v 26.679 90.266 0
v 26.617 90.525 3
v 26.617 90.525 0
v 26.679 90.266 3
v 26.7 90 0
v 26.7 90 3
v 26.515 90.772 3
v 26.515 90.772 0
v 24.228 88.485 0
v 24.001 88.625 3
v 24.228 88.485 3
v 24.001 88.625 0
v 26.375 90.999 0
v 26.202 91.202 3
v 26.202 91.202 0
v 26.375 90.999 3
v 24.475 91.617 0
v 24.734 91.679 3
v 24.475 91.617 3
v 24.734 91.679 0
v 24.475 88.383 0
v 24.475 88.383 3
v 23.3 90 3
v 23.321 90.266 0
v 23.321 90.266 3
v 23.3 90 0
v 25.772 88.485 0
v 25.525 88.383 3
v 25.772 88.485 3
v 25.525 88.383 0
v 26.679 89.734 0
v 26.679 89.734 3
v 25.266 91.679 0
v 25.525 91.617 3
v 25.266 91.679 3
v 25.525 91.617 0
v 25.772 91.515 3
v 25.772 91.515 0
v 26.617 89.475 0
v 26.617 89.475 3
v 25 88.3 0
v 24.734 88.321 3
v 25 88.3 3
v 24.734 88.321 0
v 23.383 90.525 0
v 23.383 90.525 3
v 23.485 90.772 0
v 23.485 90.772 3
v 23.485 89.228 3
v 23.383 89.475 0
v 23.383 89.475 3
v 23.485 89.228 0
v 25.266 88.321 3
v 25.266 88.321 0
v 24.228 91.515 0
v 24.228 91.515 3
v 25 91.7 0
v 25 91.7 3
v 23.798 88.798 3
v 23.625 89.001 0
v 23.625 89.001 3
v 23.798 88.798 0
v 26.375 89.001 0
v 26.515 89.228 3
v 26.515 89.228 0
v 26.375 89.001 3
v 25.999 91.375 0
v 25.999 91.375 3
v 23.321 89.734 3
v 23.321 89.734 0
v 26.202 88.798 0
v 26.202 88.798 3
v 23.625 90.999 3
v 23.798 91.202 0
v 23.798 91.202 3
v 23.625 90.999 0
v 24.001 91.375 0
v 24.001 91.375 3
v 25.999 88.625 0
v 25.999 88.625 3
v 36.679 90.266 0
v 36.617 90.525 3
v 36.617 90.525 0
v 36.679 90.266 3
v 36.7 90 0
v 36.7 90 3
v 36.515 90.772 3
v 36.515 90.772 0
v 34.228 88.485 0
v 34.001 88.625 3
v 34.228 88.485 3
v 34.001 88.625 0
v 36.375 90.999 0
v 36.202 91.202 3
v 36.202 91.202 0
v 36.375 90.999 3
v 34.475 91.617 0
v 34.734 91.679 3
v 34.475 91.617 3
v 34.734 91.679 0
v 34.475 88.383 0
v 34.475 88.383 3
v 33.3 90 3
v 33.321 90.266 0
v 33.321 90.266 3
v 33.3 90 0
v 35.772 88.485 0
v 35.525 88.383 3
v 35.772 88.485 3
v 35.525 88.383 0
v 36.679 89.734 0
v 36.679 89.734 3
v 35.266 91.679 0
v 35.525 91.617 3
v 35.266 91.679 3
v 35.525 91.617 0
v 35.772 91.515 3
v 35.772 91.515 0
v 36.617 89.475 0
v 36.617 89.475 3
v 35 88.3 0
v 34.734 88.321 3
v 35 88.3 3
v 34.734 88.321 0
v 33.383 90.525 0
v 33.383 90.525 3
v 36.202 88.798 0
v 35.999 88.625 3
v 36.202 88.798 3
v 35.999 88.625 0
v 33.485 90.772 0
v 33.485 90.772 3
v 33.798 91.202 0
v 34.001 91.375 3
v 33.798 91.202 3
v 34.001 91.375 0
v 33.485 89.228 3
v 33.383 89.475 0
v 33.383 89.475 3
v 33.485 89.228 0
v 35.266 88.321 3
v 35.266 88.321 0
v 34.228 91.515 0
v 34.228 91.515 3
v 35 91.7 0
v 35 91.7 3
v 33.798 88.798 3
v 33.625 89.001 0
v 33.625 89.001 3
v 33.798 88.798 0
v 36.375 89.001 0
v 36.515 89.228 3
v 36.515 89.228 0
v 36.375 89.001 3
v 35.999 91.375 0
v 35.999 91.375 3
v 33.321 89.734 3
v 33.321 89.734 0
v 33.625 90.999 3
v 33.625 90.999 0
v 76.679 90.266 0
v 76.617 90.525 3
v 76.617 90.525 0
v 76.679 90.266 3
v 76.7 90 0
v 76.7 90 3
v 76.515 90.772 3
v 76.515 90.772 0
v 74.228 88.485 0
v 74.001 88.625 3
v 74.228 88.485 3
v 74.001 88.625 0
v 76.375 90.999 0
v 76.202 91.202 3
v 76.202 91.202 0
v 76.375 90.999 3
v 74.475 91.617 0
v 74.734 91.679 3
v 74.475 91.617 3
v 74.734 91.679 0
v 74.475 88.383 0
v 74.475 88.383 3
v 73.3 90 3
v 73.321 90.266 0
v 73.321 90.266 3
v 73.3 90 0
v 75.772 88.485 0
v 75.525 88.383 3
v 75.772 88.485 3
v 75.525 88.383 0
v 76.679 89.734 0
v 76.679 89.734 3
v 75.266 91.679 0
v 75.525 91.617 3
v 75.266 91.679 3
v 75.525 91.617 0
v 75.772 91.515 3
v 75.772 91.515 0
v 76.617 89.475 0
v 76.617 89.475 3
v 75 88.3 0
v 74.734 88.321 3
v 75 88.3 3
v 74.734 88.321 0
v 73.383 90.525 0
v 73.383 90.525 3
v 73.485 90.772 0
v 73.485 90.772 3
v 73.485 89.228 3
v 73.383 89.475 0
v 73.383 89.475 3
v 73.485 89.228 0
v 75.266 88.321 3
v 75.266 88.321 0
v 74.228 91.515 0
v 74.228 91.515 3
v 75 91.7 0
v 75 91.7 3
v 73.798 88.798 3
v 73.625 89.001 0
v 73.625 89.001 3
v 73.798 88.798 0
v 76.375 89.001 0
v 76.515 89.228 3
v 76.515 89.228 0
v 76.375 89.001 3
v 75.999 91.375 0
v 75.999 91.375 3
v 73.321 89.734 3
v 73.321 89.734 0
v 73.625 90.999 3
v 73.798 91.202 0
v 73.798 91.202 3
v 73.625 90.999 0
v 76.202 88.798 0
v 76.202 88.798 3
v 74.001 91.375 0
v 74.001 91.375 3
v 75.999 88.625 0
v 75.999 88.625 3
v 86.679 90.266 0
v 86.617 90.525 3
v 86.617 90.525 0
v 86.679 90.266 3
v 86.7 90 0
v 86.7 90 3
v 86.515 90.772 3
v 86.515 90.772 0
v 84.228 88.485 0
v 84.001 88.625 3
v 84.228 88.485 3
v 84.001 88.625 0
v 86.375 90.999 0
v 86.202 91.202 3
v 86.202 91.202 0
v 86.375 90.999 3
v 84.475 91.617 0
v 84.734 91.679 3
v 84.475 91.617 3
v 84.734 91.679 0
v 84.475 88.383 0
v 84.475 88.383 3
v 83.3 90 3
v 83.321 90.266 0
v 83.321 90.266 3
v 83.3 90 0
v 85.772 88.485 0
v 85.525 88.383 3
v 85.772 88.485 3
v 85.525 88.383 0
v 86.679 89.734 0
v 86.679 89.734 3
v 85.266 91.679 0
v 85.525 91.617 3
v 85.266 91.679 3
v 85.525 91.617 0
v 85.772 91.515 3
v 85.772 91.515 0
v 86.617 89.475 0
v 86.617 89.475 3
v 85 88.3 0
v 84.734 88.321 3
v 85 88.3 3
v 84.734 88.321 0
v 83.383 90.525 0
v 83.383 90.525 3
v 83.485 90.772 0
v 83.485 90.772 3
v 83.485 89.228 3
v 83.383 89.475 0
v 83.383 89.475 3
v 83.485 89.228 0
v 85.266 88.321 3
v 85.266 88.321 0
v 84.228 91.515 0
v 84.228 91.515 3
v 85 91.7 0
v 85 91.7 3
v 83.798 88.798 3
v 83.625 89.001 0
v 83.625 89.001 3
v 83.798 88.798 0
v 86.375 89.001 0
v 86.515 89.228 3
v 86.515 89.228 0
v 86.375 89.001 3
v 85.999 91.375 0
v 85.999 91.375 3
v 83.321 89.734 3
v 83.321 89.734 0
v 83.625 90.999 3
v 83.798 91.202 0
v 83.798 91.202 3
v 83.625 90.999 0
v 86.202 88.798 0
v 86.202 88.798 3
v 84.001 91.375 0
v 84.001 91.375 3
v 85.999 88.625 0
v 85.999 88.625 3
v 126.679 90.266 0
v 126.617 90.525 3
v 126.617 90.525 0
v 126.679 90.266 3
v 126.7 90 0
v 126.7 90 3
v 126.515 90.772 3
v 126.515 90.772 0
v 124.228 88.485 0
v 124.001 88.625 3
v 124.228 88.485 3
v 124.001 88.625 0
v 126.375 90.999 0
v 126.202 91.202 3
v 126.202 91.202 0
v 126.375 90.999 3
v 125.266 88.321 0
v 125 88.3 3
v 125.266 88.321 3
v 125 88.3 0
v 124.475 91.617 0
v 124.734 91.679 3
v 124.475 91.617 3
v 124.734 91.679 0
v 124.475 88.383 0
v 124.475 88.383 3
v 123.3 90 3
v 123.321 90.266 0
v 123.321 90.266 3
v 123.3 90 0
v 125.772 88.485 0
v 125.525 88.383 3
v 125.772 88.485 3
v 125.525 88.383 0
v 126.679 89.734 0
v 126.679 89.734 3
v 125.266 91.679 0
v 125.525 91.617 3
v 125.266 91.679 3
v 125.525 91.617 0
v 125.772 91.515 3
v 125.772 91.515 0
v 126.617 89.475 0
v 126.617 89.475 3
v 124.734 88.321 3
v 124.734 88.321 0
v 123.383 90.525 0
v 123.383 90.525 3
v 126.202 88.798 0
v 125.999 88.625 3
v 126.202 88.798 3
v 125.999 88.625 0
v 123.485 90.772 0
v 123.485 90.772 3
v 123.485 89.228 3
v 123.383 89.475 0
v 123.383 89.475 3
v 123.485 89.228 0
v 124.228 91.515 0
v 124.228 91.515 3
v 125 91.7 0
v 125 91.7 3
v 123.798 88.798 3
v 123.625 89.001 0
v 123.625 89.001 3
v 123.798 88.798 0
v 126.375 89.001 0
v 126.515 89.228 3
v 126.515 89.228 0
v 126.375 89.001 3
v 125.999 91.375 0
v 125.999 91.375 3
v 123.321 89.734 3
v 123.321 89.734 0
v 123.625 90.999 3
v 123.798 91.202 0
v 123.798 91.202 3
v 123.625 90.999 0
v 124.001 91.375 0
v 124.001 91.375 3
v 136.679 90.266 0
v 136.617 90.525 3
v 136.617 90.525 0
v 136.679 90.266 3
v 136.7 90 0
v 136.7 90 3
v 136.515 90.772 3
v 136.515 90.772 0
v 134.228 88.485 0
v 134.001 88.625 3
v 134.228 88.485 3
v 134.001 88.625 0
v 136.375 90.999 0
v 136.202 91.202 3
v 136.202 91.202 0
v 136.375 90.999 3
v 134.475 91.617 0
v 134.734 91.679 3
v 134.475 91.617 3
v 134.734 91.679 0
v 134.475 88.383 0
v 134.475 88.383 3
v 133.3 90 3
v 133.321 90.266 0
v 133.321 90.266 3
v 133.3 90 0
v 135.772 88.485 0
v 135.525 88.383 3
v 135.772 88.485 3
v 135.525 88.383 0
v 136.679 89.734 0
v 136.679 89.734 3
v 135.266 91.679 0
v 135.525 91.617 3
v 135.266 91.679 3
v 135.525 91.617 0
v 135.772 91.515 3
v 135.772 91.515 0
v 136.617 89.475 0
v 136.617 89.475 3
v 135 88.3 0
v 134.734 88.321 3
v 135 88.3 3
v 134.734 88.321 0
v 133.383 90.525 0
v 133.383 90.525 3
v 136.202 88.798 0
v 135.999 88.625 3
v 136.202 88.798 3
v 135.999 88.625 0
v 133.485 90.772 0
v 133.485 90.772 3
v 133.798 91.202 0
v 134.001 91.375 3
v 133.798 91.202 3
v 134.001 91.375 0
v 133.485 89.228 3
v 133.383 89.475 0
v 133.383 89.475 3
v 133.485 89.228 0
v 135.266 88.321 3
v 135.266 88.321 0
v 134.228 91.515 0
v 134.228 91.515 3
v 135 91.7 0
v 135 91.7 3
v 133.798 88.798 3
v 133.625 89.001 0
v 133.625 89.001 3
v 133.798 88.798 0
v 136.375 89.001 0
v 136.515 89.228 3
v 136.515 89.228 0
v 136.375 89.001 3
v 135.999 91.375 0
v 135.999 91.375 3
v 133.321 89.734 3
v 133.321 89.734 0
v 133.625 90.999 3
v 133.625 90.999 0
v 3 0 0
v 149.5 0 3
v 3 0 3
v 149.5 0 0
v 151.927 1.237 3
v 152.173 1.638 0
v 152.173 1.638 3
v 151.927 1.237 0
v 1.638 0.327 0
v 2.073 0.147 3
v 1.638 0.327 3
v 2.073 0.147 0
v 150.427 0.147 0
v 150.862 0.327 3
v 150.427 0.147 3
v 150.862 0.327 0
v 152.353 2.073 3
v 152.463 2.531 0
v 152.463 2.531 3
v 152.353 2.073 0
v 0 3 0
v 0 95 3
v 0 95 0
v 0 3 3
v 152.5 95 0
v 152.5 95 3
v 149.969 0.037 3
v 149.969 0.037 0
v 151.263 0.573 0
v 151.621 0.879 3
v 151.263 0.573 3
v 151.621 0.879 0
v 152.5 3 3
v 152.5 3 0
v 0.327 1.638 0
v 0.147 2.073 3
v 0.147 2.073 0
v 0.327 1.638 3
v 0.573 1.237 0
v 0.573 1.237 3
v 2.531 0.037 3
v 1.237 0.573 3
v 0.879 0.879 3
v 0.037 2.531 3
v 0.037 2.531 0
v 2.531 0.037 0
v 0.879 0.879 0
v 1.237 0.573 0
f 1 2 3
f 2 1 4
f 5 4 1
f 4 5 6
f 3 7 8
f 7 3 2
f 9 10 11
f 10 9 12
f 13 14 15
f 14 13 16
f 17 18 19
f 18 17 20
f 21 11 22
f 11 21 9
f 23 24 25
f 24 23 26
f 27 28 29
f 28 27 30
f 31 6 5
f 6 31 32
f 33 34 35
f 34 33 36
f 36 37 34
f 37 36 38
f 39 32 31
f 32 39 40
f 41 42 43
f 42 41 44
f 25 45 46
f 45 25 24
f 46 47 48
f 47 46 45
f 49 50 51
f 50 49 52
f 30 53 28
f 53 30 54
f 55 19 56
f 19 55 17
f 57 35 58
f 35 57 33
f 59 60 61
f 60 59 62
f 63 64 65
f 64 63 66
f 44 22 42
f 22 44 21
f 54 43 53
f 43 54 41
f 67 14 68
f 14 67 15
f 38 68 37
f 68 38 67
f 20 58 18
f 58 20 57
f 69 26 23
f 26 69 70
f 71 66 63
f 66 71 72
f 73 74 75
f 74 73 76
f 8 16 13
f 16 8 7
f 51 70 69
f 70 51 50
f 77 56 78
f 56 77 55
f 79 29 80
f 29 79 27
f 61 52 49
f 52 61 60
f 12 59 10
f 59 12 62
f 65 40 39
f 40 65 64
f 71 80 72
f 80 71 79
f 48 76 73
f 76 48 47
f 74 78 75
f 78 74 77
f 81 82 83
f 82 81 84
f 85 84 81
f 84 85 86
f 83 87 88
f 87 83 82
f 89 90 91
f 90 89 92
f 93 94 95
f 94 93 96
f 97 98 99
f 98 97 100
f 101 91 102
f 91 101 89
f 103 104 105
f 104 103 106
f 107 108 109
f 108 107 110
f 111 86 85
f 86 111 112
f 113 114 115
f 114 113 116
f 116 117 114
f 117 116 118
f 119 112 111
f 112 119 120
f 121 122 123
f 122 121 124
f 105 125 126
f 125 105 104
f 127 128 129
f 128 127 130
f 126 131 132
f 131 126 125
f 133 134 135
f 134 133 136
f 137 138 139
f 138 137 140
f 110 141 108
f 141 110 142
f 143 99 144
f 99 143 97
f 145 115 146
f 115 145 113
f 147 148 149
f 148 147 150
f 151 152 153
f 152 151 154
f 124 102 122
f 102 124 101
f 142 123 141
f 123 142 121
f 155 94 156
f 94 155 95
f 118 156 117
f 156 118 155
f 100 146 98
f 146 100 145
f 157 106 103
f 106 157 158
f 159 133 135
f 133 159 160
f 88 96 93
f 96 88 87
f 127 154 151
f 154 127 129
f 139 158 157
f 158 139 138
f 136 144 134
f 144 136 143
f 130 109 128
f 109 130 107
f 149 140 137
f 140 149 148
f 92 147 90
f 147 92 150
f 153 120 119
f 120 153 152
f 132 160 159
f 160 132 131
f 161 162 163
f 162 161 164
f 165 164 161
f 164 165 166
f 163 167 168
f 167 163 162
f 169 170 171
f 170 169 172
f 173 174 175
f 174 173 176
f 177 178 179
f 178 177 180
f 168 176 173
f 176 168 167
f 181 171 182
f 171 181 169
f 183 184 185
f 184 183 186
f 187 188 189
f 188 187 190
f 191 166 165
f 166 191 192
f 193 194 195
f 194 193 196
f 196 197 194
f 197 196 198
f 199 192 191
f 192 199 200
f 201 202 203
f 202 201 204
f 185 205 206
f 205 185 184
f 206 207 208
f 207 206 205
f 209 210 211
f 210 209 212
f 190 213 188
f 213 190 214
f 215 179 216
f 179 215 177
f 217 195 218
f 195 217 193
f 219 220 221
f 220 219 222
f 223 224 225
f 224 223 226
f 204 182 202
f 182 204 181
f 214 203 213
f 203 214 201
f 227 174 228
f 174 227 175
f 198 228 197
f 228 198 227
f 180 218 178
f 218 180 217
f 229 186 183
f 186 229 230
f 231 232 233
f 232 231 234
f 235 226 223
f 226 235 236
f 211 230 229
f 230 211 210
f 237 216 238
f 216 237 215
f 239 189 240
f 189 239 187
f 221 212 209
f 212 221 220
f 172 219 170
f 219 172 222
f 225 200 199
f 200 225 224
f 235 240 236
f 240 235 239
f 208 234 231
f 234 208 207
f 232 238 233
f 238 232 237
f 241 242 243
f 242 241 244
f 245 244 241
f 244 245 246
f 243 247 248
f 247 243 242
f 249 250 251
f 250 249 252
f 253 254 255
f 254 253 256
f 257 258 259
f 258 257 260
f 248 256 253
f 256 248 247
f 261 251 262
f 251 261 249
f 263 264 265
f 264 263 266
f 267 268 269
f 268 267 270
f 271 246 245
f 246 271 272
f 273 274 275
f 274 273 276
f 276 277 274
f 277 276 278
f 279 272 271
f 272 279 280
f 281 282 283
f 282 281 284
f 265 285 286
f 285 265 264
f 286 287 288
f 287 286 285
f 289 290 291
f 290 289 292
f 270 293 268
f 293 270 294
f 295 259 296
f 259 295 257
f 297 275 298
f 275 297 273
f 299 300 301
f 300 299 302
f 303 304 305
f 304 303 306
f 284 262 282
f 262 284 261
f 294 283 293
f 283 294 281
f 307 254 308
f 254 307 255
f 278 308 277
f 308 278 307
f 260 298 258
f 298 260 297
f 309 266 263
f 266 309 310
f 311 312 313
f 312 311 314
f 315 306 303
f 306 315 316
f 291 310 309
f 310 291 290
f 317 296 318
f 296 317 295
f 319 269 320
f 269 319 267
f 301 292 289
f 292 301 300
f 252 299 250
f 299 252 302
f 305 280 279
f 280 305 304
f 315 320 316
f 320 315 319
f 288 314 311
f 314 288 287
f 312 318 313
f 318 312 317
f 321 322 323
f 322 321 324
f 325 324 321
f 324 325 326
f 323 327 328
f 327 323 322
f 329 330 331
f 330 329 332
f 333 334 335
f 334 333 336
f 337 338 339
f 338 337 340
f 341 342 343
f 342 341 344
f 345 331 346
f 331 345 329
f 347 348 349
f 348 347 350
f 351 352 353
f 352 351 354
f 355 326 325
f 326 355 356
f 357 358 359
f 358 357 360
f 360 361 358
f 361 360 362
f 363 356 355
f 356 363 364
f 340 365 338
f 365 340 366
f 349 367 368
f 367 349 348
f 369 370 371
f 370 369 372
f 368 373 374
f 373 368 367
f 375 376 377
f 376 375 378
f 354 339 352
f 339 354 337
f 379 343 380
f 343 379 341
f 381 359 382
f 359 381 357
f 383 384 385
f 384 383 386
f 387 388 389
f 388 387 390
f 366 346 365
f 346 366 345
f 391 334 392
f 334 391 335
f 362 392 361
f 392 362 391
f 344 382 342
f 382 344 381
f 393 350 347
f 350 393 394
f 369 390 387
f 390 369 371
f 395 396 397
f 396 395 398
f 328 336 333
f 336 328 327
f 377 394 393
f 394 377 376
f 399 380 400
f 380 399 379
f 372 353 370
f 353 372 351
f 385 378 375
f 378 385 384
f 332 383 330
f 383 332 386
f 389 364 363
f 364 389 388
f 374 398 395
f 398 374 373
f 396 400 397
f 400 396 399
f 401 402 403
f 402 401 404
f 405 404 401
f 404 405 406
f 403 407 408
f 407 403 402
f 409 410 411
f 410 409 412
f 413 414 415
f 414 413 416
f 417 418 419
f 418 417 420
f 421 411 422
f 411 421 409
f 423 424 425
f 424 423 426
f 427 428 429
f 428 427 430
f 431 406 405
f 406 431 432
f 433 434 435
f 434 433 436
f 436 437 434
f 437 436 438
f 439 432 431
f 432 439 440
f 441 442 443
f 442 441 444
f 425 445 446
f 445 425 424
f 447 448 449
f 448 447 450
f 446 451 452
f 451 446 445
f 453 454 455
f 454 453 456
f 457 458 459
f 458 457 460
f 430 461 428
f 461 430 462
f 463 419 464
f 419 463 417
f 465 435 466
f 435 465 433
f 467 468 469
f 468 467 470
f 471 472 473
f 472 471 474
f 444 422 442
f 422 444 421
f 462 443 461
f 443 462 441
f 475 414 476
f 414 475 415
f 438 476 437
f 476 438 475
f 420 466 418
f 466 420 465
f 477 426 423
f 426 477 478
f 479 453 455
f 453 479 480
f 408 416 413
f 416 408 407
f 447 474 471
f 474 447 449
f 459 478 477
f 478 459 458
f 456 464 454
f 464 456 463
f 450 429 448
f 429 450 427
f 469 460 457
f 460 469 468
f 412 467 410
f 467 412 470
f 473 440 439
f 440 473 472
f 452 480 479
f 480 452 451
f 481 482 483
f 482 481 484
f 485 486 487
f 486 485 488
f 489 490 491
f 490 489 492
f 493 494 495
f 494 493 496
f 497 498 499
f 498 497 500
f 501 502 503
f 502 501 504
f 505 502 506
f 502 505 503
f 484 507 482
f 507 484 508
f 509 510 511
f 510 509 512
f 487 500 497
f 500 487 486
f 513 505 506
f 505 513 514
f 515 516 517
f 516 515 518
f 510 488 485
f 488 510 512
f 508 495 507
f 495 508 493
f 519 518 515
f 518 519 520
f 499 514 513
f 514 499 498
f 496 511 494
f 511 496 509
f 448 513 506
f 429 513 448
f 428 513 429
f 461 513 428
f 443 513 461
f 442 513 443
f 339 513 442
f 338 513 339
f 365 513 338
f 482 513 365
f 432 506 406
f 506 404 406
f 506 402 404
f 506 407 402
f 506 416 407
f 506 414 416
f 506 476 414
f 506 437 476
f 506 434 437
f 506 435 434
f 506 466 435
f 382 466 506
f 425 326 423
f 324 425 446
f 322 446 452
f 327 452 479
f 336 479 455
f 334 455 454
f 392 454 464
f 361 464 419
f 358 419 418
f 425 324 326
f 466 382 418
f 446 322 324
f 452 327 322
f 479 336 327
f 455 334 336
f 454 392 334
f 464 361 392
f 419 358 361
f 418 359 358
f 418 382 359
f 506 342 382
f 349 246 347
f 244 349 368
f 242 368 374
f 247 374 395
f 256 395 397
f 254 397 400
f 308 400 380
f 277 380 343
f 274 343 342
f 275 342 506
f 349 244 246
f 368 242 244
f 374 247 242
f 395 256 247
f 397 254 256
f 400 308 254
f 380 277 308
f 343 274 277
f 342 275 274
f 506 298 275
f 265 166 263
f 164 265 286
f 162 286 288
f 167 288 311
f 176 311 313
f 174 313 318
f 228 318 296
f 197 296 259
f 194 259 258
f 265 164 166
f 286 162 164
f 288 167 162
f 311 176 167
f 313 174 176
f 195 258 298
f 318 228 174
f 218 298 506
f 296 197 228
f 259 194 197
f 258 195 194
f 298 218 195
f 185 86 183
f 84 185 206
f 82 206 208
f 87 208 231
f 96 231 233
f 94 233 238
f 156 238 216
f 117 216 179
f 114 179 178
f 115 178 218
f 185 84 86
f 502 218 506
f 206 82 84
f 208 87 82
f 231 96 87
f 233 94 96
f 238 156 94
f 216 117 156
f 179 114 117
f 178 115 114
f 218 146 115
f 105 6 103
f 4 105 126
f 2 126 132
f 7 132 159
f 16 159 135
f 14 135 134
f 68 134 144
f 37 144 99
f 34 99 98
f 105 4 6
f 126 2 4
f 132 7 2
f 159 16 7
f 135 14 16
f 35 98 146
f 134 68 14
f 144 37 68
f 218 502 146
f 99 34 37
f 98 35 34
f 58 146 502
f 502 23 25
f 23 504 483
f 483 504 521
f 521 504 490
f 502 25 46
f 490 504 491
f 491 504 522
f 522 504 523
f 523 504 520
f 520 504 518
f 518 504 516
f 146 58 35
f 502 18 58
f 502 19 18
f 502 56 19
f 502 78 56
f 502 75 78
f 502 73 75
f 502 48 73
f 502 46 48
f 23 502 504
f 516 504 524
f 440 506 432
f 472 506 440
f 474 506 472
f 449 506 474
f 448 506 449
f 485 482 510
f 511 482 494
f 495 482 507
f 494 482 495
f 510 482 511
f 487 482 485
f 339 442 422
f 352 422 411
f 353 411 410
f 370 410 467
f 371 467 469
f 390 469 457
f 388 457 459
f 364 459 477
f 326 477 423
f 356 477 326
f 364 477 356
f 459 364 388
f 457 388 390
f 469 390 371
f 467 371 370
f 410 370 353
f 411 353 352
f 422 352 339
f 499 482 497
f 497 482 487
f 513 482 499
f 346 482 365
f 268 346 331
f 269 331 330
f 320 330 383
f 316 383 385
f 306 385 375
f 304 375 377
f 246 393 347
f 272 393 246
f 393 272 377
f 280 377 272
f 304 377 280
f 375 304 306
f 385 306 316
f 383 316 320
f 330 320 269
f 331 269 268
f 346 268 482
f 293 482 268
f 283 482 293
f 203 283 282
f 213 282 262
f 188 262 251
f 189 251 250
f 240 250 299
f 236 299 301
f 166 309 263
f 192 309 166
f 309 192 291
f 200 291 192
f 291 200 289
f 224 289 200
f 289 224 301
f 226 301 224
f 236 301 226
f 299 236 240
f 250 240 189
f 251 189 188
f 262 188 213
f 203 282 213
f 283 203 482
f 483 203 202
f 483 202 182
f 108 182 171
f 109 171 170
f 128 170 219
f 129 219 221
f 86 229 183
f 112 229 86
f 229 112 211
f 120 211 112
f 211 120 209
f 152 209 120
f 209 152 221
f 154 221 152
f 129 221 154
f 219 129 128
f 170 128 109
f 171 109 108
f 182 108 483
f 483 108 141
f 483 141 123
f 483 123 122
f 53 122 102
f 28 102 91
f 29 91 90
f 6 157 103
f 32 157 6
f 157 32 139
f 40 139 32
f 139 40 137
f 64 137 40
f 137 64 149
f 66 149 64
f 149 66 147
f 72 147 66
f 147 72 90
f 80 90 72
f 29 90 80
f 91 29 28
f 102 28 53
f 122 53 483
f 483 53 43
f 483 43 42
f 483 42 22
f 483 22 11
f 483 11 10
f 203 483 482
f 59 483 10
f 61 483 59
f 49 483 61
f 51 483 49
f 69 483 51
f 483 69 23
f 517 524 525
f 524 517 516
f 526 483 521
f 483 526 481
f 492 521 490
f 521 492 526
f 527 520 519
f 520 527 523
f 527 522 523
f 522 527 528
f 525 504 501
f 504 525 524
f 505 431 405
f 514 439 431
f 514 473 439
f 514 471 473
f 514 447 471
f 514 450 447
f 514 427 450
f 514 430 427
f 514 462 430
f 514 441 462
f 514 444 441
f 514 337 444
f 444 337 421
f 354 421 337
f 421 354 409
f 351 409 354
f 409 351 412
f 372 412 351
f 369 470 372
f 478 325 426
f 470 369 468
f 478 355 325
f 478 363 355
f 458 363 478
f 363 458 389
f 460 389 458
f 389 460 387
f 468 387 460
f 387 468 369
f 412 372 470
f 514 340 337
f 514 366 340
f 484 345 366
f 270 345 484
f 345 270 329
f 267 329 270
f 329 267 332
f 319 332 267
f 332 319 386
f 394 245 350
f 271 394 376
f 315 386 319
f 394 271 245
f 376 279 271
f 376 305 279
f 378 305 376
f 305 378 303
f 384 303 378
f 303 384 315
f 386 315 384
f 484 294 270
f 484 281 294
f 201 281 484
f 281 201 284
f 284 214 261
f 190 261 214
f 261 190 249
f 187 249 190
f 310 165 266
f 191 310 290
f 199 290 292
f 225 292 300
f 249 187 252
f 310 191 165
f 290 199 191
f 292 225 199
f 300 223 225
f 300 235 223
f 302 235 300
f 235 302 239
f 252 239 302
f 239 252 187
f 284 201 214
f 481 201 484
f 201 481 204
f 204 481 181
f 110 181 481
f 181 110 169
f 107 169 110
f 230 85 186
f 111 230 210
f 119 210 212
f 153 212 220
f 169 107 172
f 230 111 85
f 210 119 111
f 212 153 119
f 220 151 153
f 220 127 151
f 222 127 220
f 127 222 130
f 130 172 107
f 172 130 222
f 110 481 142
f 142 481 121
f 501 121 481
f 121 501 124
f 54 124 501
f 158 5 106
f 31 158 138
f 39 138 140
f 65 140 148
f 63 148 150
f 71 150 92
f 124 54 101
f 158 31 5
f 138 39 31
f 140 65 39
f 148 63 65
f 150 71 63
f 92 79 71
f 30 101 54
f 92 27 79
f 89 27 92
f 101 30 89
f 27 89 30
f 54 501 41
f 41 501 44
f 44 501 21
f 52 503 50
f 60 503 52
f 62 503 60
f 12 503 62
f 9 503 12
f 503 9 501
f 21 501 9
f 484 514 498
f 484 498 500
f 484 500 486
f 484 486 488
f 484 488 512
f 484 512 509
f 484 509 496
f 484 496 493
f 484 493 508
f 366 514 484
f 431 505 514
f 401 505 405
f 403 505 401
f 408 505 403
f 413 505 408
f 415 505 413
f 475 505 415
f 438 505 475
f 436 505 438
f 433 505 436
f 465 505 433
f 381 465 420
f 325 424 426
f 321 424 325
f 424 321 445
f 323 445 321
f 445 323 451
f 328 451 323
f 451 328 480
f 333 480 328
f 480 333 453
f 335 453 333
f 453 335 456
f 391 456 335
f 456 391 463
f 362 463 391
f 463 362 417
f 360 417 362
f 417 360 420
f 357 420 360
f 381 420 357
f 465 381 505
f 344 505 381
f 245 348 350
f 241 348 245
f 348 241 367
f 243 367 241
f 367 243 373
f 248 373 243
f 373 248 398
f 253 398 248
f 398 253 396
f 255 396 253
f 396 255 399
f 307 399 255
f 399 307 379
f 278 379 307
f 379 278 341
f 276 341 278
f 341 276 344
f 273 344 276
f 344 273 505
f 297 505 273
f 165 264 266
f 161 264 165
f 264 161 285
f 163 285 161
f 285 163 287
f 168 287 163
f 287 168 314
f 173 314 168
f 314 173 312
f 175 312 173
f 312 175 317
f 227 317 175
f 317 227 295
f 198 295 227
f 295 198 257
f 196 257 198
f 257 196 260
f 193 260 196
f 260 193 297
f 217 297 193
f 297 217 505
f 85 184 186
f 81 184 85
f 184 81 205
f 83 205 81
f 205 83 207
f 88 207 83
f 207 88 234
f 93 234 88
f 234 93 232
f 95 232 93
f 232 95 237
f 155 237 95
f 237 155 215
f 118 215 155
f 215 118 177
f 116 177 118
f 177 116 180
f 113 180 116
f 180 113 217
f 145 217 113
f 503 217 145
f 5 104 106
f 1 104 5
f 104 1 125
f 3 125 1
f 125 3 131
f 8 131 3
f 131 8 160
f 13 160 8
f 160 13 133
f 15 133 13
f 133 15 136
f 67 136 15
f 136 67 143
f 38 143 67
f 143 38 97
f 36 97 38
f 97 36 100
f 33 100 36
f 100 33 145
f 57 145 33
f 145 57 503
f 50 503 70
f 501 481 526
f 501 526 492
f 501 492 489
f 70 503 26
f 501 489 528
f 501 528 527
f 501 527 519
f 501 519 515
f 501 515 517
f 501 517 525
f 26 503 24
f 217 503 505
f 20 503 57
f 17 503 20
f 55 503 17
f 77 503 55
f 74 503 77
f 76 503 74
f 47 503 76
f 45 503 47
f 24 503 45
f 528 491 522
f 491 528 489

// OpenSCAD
// FoldIt Robot - Bottom Folding Panel
// Scale: 1:4
// Dimensions: 152.5mm x 95mm x 3mm
// Folds upward from the bottom edge to fold the bottom of clothing

$fn = 40;

// Panel parameters
panel_width = 152.5;    // full base width
panel_length = 95;      // ~half of base length (190.5 / 2)
panel_thickness = 3;

// Hinge hole parameters
m3_hole = 3.4;
hinge_pair_gap = 10;
hinge_edge_offset = 5;   // distance from hinge edge to hole center

// Rounded edge radius
edge_radius = 3;

module bottom_panel() {
    difference() {
        // Main panel body with rounded bottom edge
        _panel_body();

        // Hinge holes along top (inner) edge - matching base plate bottom edge
        for (i = [0:2]) {
            x_pos = 25 + i * 50;
            for (j = [0:1]) {
                translate([x_pos + j * hinge_pair_gap, panel_length - hinge_edge_offset, -0.5])
                    cylinder(d=m3_hole, h=panel_thickness + 1);
            }
        }
    }
}

module _panel_body() {
    // Panel with rounded bottom (outer) edge
    hull() {
        // Top (inner) edge - square corners
        translate([0, panel_length - 0.5, 0])
            cube([panel_width, 0.5, panel_thickness]);

        // Bottom edge - rounded corners
        translate([edge_radius, edge_radius, 0])
            cylinder(r=edge_radius, h=panel_thickness);
        translate([panel_width - edge_radius, edge_radius, 0])
            cylinder(r=edge_radius, h=panel_thickness);

        // Fill the middle
        translate([0, edge_radius, 0])
            cube([panel_width, panel_length - edge_radius, panel_thickness]);
    }
}

// Render when opened directly
bottom_panel();
